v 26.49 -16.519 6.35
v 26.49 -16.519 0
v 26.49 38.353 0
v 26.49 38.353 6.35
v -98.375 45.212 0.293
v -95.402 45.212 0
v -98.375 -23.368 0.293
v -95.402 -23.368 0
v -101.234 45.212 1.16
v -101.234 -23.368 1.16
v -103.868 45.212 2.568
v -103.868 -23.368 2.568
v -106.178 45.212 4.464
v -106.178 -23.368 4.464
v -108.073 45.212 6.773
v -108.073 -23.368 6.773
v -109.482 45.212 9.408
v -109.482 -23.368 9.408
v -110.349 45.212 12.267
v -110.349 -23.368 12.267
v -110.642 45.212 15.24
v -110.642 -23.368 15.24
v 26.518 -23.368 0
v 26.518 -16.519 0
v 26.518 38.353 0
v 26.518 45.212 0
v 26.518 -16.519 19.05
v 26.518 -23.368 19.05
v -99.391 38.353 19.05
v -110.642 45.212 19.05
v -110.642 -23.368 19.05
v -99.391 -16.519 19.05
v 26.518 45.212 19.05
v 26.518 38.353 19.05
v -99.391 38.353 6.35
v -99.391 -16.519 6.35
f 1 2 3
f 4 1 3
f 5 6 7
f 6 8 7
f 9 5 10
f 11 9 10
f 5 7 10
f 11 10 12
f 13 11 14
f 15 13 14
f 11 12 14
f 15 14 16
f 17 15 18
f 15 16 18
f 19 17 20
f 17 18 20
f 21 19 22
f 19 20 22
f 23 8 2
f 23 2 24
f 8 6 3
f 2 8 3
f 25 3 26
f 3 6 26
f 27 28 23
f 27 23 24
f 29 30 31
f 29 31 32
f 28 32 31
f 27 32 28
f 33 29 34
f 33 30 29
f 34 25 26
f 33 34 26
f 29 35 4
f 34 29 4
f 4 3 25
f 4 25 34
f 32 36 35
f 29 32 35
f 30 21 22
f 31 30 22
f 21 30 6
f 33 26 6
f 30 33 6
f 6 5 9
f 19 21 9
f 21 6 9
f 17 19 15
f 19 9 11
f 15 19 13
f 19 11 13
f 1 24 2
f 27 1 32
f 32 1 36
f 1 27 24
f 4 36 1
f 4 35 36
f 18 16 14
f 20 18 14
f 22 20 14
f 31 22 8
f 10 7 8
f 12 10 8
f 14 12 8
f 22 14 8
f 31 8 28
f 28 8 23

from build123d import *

# Parameters (mm, degrees)
F1_DEPTH = 19.05
F2_W     = 128.431639
F2_H     = 61.237093
F3_DEPTH = 6.35
F4_R     = 15.24


with BuildPart() as f1:
    # F0 (on Top) → F1 (new body)
    with BuildSketch(Plane.XY):
        Polygon((-110.641599, 45.212001), (-110.641599, -23.367999), (26.518401, -23.367999), (26.518401, -16.519178), (-99.390604, -16.519178), (-99.390604, 38.352568), (26.518401, 38.352568), (26.518401, 45.212001), align=None)
    extrude(amount=F1_DEPTH)

    # F2 (on Top) → F3 (join)
    with BuildSketch(Plane.XY):
        with Locations((-37.725527, 10.113819)):
            Rectangle(F2_W, F2_H)
    extrude(amount=F3_DEPTH)

    # F4
    f4_edges = [f1.edges().sort_by_distance(p)[0] for p in [
        (-110.641599, 10.922001, 0),
    ]]
    fillet(f4_edges, radius=F4_R)


solid = f1.part
